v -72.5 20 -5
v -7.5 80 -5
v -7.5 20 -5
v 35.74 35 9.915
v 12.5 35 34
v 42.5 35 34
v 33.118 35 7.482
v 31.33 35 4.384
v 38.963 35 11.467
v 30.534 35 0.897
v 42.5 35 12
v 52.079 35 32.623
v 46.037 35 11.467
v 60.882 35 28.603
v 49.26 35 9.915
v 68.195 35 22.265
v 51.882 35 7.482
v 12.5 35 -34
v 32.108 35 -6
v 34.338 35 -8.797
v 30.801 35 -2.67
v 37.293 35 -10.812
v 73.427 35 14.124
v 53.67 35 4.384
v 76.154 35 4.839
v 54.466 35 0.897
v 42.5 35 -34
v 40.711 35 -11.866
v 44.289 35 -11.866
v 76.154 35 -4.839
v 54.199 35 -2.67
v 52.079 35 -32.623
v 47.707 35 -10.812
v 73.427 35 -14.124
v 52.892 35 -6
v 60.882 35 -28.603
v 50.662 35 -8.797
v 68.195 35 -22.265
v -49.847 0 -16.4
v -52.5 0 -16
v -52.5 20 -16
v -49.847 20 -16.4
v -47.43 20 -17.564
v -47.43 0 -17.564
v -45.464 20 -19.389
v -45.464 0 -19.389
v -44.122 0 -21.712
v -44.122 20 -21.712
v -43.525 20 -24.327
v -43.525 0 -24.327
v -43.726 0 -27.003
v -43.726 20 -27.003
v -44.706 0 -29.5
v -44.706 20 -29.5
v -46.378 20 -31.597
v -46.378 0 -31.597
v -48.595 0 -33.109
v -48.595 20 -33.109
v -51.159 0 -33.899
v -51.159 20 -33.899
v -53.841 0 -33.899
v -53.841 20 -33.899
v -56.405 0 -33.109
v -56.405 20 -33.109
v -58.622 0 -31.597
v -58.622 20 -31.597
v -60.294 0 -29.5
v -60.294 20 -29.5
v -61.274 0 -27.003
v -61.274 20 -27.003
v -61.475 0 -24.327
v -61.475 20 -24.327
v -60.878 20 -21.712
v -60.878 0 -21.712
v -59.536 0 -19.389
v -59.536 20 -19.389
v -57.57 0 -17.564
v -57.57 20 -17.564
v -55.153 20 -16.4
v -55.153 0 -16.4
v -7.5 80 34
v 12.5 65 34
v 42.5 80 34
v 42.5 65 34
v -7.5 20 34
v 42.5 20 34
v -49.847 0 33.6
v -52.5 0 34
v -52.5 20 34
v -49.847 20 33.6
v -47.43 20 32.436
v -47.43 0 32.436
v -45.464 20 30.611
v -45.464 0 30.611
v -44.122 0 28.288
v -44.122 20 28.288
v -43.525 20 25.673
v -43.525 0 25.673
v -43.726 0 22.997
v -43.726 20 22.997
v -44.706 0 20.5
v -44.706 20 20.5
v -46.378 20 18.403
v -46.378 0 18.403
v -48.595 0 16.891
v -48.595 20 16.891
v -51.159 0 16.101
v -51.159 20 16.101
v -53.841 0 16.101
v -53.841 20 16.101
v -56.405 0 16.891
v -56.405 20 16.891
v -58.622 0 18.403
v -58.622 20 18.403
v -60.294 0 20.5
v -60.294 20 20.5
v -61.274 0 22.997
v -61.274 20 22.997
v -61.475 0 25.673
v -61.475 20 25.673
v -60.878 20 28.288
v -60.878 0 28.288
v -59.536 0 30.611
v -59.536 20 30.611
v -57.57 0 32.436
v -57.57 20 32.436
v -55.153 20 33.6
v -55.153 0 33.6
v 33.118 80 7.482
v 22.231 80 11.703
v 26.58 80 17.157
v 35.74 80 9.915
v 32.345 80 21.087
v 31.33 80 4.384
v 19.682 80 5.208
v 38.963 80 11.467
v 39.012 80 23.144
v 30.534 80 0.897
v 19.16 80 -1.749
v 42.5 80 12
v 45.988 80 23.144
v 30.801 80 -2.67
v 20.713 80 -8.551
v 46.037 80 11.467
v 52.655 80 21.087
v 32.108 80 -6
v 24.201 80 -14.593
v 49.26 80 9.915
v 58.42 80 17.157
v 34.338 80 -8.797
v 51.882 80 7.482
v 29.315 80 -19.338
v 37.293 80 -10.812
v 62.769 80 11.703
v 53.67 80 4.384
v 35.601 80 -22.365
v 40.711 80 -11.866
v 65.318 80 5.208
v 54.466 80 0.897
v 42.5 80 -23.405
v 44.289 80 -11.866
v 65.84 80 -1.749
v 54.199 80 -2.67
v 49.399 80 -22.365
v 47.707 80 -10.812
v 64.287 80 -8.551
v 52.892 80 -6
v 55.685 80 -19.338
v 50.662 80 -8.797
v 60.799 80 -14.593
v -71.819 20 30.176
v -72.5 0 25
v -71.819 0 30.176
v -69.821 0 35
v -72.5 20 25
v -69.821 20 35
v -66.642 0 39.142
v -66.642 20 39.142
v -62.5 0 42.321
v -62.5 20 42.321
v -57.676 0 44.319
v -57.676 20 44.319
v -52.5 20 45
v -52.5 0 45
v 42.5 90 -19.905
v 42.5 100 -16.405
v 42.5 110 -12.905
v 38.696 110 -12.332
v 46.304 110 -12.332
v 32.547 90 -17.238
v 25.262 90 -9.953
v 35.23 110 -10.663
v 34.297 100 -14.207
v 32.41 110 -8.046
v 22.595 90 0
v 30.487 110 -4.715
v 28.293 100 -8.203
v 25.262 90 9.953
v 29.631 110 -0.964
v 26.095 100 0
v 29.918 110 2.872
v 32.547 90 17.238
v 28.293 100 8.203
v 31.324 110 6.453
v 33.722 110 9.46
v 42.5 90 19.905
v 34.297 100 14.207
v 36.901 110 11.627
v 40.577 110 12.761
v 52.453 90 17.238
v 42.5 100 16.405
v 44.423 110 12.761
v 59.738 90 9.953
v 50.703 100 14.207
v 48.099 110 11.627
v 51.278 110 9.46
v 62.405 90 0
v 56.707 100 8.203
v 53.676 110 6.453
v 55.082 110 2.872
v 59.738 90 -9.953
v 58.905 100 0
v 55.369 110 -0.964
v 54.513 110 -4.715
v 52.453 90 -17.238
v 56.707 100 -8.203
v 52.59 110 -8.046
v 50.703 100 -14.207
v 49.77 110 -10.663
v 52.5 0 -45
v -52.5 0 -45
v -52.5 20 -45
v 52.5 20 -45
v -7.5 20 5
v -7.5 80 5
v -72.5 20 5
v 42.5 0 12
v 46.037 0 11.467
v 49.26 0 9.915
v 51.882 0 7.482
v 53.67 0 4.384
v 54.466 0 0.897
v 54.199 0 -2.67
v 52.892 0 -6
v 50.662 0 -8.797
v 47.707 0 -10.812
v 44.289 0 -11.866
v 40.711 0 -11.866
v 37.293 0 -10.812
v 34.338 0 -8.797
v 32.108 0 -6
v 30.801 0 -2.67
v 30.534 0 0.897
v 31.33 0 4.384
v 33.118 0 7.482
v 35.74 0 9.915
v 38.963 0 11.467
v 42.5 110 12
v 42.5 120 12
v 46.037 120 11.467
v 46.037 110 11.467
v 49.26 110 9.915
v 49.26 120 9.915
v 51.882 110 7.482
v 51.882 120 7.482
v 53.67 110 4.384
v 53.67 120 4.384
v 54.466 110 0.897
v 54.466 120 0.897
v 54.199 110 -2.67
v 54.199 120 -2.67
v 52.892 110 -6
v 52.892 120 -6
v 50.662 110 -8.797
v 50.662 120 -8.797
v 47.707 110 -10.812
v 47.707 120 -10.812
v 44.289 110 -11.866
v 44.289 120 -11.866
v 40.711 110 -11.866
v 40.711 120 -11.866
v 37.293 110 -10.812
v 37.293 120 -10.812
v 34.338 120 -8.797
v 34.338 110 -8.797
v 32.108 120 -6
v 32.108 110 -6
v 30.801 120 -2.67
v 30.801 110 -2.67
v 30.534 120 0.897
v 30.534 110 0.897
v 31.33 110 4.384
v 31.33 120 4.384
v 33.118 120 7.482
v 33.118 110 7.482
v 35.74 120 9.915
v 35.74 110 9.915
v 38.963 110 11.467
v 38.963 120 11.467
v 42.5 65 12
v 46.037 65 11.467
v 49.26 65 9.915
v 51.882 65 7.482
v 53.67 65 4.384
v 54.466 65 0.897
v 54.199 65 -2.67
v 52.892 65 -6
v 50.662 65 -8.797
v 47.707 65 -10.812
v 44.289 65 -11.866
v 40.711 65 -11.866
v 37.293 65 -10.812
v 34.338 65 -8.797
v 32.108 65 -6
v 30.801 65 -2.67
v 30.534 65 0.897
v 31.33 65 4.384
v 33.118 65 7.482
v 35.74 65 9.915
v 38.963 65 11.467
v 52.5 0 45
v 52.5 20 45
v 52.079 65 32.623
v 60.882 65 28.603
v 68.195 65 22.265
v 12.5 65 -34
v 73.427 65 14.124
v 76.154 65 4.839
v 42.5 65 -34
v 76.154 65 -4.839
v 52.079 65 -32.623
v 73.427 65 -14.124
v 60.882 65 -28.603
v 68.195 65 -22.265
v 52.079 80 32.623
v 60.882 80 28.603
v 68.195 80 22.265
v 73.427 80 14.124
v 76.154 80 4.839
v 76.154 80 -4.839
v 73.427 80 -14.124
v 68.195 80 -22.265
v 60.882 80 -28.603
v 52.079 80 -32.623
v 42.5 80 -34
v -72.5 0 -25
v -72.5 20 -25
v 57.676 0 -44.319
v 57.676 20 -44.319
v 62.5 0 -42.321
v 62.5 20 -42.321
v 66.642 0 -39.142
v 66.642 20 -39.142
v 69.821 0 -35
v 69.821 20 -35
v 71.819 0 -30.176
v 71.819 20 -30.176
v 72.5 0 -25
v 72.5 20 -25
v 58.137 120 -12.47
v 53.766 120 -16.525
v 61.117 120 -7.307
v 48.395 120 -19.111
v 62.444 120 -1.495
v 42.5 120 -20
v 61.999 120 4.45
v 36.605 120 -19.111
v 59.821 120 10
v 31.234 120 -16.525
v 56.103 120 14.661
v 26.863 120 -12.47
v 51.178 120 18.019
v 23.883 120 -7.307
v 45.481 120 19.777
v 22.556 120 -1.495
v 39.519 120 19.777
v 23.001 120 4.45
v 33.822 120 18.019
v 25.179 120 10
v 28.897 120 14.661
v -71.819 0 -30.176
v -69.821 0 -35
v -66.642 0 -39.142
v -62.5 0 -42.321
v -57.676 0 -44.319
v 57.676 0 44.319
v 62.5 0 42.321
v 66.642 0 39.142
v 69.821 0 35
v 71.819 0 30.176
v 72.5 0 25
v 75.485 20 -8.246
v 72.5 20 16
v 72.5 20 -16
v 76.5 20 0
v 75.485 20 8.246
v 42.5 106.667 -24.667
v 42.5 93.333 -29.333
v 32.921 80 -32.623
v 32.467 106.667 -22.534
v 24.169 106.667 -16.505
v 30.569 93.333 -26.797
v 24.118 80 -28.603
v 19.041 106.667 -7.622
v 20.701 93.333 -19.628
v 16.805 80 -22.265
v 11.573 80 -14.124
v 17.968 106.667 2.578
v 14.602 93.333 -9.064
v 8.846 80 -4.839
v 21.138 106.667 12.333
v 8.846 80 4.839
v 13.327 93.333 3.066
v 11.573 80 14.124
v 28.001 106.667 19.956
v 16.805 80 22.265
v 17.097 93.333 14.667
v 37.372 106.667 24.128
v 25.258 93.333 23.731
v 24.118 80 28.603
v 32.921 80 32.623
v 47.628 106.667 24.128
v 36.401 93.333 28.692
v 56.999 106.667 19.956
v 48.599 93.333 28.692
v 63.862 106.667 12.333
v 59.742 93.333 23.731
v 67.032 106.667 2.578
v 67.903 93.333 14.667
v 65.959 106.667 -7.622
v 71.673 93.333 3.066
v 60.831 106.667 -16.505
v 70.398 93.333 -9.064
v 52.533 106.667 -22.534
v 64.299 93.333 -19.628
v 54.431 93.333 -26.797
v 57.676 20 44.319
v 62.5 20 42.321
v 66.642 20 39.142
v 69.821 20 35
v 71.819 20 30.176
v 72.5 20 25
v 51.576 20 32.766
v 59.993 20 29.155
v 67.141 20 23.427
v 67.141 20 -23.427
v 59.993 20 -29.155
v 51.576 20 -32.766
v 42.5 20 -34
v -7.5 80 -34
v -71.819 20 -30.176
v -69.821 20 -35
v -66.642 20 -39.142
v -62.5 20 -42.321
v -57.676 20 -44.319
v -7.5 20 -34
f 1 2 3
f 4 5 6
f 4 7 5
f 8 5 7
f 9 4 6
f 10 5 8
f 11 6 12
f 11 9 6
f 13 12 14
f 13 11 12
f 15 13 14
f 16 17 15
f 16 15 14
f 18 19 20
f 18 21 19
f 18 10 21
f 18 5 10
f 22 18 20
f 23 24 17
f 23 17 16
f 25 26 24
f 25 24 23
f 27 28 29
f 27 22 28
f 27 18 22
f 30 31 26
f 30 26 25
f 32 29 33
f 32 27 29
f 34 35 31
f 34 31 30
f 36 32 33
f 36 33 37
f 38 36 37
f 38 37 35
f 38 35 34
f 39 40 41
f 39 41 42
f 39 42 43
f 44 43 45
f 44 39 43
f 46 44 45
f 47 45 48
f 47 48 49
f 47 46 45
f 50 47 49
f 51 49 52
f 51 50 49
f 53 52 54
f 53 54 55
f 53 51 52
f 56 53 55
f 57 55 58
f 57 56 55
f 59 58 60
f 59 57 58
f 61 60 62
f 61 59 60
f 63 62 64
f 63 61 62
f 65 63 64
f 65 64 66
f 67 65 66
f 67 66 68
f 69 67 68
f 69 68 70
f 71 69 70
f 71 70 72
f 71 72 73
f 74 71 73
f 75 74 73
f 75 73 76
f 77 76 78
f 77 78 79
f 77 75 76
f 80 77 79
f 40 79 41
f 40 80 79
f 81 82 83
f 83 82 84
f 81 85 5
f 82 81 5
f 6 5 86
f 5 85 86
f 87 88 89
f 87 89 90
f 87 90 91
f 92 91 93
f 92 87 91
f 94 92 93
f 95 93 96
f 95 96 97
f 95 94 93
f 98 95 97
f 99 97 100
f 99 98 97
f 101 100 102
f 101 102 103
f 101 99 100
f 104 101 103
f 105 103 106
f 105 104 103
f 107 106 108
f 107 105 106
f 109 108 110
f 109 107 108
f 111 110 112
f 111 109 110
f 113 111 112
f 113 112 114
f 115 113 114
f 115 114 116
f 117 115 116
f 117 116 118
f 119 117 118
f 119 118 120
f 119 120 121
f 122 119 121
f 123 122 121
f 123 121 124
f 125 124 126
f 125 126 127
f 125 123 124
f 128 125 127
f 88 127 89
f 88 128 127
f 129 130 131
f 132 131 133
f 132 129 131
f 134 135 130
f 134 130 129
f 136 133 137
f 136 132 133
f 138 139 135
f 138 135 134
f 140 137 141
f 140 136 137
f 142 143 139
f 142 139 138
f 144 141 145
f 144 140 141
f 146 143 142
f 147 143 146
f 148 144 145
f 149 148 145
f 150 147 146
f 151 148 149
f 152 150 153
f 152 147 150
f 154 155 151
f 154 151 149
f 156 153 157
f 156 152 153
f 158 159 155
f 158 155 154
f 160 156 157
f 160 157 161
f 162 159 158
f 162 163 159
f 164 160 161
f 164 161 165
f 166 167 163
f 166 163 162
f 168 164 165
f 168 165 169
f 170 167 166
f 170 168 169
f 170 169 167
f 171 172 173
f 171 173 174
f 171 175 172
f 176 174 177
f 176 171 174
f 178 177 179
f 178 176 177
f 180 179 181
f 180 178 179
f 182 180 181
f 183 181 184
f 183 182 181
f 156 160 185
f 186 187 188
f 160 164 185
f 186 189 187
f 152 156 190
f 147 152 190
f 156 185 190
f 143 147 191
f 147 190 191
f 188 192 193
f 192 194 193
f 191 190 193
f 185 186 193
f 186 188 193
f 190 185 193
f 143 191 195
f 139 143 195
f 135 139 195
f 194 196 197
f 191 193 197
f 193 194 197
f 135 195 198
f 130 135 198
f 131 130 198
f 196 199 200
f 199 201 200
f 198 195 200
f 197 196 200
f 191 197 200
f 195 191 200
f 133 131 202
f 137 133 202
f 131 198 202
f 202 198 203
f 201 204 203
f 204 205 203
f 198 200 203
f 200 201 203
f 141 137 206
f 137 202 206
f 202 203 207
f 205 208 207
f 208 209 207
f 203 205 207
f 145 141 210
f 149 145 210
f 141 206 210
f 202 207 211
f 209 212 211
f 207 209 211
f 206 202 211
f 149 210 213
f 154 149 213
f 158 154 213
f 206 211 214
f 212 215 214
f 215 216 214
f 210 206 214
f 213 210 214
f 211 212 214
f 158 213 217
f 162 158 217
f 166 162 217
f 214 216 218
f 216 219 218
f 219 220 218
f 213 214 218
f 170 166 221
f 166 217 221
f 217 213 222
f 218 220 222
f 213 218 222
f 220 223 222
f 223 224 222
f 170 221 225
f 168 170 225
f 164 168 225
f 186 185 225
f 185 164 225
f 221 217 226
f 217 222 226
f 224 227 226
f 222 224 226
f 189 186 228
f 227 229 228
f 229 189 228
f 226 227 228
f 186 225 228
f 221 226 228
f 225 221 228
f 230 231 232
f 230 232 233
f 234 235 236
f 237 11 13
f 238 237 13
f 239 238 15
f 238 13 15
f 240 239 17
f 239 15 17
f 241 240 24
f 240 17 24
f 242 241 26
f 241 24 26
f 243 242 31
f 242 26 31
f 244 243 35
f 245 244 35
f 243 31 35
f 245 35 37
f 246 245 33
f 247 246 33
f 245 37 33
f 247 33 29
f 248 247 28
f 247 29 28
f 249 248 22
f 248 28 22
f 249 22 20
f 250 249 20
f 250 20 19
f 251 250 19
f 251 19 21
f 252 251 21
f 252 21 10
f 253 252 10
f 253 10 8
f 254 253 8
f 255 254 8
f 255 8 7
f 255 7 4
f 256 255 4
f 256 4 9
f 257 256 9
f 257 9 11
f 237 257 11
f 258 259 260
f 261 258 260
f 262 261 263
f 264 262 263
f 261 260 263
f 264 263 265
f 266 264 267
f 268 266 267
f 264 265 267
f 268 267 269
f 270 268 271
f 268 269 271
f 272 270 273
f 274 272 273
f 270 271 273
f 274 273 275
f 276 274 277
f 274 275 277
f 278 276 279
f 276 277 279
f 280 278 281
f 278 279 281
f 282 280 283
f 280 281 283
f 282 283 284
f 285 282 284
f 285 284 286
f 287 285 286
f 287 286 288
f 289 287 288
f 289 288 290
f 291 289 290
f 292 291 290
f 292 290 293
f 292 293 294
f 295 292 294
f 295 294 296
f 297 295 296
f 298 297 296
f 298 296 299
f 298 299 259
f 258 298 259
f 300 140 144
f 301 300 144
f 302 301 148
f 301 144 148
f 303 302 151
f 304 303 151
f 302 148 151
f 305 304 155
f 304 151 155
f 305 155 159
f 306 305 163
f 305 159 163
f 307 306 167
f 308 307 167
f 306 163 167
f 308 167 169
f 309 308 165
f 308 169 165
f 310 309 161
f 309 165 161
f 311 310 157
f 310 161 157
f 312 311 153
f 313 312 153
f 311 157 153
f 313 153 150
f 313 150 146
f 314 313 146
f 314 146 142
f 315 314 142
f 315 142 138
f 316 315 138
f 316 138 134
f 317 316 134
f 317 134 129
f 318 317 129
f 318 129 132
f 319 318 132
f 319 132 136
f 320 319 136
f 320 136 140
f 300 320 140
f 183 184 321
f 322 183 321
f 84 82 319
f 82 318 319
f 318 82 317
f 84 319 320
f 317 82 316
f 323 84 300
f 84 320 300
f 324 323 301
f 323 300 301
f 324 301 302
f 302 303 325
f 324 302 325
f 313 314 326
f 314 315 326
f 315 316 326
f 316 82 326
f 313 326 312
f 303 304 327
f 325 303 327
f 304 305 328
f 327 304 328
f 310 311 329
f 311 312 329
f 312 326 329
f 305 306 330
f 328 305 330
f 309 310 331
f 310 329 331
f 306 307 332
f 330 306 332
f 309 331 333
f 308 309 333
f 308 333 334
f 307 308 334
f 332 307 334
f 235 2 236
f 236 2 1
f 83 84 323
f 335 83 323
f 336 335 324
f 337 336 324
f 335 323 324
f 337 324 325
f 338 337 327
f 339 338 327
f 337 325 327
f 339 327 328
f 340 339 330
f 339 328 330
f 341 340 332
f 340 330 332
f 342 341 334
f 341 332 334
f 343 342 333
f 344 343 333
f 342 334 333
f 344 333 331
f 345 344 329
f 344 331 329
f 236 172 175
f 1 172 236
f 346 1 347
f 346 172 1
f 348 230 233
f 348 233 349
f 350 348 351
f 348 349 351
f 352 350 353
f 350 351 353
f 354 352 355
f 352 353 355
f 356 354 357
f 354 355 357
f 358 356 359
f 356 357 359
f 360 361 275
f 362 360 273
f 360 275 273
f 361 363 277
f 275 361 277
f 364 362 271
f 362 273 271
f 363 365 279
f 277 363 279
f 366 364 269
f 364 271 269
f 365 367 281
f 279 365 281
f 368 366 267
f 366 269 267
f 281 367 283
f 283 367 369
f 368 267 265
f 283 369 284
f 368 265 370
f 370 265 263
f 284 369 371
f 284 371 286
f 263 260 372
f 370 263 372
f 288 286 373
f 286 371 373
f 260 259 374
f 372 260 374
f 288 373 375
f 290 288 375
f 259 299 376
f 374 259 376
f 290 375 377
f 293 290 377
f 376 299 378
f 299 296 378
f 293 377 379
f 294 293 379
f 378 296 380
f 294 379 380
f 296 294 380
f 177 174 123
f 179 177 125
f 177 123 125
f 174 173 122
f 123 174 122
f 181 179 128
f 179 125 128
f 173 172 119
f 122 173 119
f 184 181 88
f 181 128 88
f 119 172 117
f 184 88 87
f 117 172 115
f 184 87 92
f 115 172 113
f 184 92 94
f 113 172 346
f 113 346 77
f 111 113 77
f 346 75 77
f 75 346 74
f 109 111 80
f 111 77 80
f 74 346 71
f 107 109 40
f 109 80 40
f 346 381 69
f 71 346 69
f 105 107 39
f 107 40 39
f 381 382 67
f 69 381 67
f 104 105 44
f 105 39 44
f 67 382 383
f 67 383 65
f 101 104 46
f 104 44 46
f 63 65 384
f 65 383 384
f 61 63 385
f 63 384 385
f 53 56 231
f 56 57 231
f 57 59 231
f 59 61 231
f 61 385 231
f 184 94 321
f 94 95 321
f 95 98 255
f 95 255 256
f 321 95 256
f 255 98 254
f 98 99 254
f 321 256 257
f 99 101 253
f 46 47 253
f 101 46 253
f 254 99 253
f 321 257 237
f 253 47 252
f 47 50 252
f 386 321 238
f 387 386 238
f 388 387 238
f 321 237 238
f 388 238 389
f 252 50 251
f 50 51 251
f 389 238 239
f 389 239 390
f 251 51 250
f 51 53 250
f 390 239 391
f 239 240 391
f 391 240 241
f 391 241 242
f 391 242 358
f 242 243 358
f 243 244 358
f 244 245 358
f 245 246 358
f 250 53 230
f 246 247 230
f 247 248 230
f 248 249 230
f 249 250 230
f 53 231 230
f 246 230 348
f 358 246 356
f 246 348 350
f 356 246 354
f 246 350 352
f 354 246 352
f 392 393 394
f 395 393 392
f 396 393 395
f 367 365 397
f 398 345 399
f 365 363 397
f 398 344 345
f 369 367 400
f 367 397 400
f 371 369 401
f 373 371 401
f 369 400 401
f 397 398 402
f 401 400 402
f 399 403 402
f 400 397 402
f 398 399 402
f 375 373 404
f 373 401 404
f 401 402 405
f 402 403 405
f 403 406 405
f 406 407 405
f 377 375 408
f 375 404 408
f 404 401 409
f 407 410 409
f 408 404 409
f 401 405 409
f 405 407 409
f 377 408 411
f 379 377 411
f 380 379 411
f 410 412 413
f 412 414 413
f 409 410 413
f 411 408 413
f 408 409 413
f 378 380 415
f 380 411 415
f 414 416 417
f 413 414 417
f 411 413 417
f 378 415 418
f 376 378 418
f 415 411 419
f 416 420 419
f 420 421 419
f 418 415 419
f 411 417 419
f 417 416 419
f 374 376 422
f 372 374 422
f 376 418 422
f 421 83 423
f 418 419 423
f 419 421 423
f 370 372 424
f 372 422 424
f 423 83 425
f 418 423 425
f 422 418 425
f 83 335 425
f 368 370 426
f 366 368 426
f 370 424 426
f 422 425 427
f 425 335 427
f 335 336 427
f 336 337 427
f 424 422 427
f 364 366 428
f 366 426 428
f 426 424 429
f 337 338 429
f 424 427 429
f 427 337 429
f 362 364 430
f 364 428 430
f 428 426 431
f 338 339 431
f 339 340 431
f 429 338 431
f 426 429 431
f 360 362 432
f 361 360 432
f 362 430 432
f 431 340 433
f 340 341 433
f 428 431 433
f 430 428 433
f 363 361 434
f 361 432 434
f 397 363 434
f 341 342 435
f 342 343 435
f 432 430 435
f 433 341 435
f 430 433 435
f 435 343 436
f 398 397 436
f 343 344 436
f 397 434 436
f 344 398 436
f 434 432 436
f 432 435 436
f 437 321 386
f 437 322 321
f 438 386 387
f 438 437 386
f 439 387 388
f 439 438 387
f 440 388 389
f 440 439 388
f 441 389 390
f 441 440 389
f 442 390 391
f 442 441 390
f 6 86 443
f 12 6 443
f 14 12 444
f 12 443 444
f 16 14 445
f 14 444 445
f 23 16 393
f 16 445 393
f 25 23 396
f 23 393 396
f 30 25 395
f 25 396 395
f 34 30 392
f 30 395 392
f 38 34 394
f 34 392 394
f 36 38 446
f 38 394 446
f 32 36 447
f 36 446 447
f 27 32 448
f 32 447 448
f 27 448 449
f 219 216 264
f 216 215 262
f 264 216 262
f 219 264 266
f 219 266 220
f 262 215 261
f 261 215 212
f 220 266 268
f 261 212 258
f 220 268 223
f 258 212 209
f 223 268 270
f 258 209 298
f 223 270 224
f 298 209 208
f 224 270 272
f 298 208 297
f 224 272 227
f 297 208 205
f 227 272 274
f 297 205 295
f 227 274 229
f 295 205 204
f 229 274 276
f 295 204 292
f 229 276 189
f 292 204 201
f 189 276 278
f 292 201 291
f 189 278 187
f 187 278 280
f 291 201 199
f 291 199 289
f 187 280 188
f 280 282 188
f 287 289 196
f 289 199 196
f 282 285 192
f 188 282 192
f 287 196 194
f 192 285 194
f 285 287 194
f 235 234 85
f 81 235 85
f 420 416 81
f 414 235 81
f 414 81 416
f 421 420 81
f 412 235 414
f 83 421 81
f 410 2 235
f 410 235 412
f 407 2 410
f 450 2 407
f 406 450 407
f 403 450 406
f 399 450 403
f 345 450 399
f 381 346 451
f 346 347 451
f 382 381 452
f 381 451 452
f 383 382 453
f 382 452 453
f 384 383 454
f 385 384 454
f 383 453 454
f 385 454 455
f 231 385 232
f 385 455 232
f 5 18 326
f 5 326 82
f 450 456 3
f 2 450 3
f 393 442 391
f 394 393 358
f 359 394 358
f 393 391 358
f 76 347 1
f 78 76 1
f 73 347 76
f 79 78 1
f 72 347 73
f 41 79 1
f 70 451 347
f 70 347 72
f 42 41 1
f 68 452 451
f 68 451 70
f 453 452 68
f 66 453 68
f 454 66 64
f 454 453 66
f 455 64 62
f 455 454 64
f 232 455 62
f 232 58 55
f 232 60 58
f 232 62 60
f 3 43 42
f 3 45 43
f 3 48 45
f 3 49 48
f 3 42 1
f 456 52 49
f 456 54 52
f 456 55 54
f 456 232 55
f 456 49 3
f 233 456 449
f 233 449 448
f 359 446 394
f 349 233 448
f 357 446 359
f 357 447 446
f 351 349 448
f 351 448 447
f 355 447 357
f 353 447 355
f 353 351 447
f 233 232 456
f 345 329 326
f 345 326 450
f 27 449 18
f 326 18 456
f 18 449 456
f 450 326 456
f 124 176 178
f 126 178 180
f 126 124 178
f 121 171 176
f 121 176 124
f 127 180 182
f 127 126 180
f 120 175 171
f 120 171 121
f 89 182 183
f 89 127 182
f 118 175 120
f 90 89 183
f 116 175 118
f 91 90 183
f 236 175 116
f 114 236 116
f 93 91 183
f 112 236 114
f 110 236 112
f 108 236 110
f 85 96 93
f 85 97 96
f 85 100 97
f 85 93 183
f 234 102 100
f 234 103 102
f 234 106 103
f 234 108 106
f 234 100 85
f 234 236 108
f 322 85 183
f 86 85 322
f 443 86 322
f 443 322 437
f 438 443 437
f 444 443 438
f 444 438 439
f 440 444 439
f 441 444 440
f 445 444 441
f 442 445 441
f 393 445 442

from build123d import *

# Parameters (mm, degrees)
SKETCH1_W           = 145
SKETCH1_H           = 90
SKETCH1_R           = 9
BOSS_EXTRUDE1_DEPTH = 20
FILLET2_R           = 20
BOSS_EXTRUDE3_DEPTH = 60
CUT_EXTRUDE1_START  = -45
CUT_EXTRUDE1_DEPTH  = 30
RIB4_REACH          = 121.487
SKETCH8_WALL_W      = 329.433924144
SKETCH8_WALL_H      = 10
SKETCH18_R          = 12
CUT_EXTRUDE2_DEPTH  = 150.255653159


with BuildPart() as part:
    # Sketch1 → Boss-Extrude1 (new body)
    with BuildSketch(Plane(origin=(0, 0, 0), x_dir=(1, 0, 0), z_dir=(0, 1, 0))):
        Rectangle(SKETCH1_W, SKETCH1_H)
        with Locations(Location((-52.5, 25, 0), (0, 0, 270))):
            Circle(SKETCH1_R, mode=Mode.SUBTRACT)
        with Locations(Location((-52.5, -25, 0), (0, 0, 270))):
            Circle(SKETCH1_R, mode=Mode.SUBTRACT)
    extrude(amount=BOSS_EXTRUDE1_DEPTH)

    # Fillet2
    fillet2_edges = [part.edges().sort_by_distance(p)[0] for p in [
        (72.5, 10, 45),
        (-72.5, 10, 45),
        (-72.5, 10, -45),
        (72.5, 10, -45),
    ]]
    fillet(fillet2_edges, radius=FILLET2_R)

    # Sketch2 → Boss-Extrude3 (add)
    with BuildSketch(Plane(origin=(0, 20, 0), x_dir=(1, 0, 0), z_dir=(0, 1, 0))):
        with BuildLine():
            Line((-7.5, 34), (-7.5, -34))
            Line((-7.5, -34), (42.5, -34))
            ThreePointArc((42.5, -34), (76.5, 0), (42.5, 34))
            Line((42.5, 34), (-7.5, 34))
        make_face()
    extrude(amount=BOSS_EXTRUDE3_DEPTH)

    # Sketch3 → Cut-Extrude1 (cut)
    with BuildSketch(Plane(origin=(0, 80, 0), x_dir=(1, 0, 0), z_dir=(0, 1, 0)).offset(CUT_EXTRUDE1_START)):
        with BuildLine():
            Line((42.5, 34), (12.5, 34))
            Line((12.5, 34), (12.5, -34))
            Line((12.5, -34), (42.5, -34))
            ThreePointArc((42.5, -34), (76.5, 0), (42.5, 34))
        make_face()
    extrude(amount=CUT_EXTRUDE1_DEPTH, mode=Mode.SUBTRACT)

    # Sketch8 wall → Rib4 (add, up to next)
    with BuildSketch(Plane(origin=(-40, 50, 0), x_dir=(-0.734803444627, -0.678280102733, 0), z_dir=(0.678280102733, -0.734803444627, 0)), mode=Mode.PRIVATE) as rib4_sk1:
        Rectangle(SKETCH8_WALL_W, SKETCH8_WALL_H)
    rib4_tool1 = extrude(rib4_sk1.sketch, amount=RIB4_REACH, mode=Mode.PRIVATE) - part.part
    add(rib4_tool1.solids().sort_by_distance((-40, 50, 0))[0])

    # Sketch17 → Revolve-Thin1 (revolve)
    with BuildSketch(Plane(origin=(42.5, 0, 0), x_dir=(0, 0, -1), z_dir=(1, 0, 0))):
        Polygon((0, 80), (0, 120), (20, 120), (34, 80), (24.561416436, 76.696495753), (12.90518995, 110), (10, 110), (10, 80), align=None)
    revolve(axis=Axis((42.5, 80, 0), (0, 1, 0)))

    # Sketch18 → Cut-Extrude2 (cut, through all)
    with BuildSketch(Plane(origin=(0, 120, 0), x_dir=(1, 0, 0), z_dir=(0, 1, 0))):
        with Locations(Location((42.5, 0, 0), (0, 0, 270))):
            Circle(SKETCH18_R)
    extrude(amount=-CUT_EXTRUDE2_DEPTH, mode=Mode.SUBTRACT)


solid = part.part
